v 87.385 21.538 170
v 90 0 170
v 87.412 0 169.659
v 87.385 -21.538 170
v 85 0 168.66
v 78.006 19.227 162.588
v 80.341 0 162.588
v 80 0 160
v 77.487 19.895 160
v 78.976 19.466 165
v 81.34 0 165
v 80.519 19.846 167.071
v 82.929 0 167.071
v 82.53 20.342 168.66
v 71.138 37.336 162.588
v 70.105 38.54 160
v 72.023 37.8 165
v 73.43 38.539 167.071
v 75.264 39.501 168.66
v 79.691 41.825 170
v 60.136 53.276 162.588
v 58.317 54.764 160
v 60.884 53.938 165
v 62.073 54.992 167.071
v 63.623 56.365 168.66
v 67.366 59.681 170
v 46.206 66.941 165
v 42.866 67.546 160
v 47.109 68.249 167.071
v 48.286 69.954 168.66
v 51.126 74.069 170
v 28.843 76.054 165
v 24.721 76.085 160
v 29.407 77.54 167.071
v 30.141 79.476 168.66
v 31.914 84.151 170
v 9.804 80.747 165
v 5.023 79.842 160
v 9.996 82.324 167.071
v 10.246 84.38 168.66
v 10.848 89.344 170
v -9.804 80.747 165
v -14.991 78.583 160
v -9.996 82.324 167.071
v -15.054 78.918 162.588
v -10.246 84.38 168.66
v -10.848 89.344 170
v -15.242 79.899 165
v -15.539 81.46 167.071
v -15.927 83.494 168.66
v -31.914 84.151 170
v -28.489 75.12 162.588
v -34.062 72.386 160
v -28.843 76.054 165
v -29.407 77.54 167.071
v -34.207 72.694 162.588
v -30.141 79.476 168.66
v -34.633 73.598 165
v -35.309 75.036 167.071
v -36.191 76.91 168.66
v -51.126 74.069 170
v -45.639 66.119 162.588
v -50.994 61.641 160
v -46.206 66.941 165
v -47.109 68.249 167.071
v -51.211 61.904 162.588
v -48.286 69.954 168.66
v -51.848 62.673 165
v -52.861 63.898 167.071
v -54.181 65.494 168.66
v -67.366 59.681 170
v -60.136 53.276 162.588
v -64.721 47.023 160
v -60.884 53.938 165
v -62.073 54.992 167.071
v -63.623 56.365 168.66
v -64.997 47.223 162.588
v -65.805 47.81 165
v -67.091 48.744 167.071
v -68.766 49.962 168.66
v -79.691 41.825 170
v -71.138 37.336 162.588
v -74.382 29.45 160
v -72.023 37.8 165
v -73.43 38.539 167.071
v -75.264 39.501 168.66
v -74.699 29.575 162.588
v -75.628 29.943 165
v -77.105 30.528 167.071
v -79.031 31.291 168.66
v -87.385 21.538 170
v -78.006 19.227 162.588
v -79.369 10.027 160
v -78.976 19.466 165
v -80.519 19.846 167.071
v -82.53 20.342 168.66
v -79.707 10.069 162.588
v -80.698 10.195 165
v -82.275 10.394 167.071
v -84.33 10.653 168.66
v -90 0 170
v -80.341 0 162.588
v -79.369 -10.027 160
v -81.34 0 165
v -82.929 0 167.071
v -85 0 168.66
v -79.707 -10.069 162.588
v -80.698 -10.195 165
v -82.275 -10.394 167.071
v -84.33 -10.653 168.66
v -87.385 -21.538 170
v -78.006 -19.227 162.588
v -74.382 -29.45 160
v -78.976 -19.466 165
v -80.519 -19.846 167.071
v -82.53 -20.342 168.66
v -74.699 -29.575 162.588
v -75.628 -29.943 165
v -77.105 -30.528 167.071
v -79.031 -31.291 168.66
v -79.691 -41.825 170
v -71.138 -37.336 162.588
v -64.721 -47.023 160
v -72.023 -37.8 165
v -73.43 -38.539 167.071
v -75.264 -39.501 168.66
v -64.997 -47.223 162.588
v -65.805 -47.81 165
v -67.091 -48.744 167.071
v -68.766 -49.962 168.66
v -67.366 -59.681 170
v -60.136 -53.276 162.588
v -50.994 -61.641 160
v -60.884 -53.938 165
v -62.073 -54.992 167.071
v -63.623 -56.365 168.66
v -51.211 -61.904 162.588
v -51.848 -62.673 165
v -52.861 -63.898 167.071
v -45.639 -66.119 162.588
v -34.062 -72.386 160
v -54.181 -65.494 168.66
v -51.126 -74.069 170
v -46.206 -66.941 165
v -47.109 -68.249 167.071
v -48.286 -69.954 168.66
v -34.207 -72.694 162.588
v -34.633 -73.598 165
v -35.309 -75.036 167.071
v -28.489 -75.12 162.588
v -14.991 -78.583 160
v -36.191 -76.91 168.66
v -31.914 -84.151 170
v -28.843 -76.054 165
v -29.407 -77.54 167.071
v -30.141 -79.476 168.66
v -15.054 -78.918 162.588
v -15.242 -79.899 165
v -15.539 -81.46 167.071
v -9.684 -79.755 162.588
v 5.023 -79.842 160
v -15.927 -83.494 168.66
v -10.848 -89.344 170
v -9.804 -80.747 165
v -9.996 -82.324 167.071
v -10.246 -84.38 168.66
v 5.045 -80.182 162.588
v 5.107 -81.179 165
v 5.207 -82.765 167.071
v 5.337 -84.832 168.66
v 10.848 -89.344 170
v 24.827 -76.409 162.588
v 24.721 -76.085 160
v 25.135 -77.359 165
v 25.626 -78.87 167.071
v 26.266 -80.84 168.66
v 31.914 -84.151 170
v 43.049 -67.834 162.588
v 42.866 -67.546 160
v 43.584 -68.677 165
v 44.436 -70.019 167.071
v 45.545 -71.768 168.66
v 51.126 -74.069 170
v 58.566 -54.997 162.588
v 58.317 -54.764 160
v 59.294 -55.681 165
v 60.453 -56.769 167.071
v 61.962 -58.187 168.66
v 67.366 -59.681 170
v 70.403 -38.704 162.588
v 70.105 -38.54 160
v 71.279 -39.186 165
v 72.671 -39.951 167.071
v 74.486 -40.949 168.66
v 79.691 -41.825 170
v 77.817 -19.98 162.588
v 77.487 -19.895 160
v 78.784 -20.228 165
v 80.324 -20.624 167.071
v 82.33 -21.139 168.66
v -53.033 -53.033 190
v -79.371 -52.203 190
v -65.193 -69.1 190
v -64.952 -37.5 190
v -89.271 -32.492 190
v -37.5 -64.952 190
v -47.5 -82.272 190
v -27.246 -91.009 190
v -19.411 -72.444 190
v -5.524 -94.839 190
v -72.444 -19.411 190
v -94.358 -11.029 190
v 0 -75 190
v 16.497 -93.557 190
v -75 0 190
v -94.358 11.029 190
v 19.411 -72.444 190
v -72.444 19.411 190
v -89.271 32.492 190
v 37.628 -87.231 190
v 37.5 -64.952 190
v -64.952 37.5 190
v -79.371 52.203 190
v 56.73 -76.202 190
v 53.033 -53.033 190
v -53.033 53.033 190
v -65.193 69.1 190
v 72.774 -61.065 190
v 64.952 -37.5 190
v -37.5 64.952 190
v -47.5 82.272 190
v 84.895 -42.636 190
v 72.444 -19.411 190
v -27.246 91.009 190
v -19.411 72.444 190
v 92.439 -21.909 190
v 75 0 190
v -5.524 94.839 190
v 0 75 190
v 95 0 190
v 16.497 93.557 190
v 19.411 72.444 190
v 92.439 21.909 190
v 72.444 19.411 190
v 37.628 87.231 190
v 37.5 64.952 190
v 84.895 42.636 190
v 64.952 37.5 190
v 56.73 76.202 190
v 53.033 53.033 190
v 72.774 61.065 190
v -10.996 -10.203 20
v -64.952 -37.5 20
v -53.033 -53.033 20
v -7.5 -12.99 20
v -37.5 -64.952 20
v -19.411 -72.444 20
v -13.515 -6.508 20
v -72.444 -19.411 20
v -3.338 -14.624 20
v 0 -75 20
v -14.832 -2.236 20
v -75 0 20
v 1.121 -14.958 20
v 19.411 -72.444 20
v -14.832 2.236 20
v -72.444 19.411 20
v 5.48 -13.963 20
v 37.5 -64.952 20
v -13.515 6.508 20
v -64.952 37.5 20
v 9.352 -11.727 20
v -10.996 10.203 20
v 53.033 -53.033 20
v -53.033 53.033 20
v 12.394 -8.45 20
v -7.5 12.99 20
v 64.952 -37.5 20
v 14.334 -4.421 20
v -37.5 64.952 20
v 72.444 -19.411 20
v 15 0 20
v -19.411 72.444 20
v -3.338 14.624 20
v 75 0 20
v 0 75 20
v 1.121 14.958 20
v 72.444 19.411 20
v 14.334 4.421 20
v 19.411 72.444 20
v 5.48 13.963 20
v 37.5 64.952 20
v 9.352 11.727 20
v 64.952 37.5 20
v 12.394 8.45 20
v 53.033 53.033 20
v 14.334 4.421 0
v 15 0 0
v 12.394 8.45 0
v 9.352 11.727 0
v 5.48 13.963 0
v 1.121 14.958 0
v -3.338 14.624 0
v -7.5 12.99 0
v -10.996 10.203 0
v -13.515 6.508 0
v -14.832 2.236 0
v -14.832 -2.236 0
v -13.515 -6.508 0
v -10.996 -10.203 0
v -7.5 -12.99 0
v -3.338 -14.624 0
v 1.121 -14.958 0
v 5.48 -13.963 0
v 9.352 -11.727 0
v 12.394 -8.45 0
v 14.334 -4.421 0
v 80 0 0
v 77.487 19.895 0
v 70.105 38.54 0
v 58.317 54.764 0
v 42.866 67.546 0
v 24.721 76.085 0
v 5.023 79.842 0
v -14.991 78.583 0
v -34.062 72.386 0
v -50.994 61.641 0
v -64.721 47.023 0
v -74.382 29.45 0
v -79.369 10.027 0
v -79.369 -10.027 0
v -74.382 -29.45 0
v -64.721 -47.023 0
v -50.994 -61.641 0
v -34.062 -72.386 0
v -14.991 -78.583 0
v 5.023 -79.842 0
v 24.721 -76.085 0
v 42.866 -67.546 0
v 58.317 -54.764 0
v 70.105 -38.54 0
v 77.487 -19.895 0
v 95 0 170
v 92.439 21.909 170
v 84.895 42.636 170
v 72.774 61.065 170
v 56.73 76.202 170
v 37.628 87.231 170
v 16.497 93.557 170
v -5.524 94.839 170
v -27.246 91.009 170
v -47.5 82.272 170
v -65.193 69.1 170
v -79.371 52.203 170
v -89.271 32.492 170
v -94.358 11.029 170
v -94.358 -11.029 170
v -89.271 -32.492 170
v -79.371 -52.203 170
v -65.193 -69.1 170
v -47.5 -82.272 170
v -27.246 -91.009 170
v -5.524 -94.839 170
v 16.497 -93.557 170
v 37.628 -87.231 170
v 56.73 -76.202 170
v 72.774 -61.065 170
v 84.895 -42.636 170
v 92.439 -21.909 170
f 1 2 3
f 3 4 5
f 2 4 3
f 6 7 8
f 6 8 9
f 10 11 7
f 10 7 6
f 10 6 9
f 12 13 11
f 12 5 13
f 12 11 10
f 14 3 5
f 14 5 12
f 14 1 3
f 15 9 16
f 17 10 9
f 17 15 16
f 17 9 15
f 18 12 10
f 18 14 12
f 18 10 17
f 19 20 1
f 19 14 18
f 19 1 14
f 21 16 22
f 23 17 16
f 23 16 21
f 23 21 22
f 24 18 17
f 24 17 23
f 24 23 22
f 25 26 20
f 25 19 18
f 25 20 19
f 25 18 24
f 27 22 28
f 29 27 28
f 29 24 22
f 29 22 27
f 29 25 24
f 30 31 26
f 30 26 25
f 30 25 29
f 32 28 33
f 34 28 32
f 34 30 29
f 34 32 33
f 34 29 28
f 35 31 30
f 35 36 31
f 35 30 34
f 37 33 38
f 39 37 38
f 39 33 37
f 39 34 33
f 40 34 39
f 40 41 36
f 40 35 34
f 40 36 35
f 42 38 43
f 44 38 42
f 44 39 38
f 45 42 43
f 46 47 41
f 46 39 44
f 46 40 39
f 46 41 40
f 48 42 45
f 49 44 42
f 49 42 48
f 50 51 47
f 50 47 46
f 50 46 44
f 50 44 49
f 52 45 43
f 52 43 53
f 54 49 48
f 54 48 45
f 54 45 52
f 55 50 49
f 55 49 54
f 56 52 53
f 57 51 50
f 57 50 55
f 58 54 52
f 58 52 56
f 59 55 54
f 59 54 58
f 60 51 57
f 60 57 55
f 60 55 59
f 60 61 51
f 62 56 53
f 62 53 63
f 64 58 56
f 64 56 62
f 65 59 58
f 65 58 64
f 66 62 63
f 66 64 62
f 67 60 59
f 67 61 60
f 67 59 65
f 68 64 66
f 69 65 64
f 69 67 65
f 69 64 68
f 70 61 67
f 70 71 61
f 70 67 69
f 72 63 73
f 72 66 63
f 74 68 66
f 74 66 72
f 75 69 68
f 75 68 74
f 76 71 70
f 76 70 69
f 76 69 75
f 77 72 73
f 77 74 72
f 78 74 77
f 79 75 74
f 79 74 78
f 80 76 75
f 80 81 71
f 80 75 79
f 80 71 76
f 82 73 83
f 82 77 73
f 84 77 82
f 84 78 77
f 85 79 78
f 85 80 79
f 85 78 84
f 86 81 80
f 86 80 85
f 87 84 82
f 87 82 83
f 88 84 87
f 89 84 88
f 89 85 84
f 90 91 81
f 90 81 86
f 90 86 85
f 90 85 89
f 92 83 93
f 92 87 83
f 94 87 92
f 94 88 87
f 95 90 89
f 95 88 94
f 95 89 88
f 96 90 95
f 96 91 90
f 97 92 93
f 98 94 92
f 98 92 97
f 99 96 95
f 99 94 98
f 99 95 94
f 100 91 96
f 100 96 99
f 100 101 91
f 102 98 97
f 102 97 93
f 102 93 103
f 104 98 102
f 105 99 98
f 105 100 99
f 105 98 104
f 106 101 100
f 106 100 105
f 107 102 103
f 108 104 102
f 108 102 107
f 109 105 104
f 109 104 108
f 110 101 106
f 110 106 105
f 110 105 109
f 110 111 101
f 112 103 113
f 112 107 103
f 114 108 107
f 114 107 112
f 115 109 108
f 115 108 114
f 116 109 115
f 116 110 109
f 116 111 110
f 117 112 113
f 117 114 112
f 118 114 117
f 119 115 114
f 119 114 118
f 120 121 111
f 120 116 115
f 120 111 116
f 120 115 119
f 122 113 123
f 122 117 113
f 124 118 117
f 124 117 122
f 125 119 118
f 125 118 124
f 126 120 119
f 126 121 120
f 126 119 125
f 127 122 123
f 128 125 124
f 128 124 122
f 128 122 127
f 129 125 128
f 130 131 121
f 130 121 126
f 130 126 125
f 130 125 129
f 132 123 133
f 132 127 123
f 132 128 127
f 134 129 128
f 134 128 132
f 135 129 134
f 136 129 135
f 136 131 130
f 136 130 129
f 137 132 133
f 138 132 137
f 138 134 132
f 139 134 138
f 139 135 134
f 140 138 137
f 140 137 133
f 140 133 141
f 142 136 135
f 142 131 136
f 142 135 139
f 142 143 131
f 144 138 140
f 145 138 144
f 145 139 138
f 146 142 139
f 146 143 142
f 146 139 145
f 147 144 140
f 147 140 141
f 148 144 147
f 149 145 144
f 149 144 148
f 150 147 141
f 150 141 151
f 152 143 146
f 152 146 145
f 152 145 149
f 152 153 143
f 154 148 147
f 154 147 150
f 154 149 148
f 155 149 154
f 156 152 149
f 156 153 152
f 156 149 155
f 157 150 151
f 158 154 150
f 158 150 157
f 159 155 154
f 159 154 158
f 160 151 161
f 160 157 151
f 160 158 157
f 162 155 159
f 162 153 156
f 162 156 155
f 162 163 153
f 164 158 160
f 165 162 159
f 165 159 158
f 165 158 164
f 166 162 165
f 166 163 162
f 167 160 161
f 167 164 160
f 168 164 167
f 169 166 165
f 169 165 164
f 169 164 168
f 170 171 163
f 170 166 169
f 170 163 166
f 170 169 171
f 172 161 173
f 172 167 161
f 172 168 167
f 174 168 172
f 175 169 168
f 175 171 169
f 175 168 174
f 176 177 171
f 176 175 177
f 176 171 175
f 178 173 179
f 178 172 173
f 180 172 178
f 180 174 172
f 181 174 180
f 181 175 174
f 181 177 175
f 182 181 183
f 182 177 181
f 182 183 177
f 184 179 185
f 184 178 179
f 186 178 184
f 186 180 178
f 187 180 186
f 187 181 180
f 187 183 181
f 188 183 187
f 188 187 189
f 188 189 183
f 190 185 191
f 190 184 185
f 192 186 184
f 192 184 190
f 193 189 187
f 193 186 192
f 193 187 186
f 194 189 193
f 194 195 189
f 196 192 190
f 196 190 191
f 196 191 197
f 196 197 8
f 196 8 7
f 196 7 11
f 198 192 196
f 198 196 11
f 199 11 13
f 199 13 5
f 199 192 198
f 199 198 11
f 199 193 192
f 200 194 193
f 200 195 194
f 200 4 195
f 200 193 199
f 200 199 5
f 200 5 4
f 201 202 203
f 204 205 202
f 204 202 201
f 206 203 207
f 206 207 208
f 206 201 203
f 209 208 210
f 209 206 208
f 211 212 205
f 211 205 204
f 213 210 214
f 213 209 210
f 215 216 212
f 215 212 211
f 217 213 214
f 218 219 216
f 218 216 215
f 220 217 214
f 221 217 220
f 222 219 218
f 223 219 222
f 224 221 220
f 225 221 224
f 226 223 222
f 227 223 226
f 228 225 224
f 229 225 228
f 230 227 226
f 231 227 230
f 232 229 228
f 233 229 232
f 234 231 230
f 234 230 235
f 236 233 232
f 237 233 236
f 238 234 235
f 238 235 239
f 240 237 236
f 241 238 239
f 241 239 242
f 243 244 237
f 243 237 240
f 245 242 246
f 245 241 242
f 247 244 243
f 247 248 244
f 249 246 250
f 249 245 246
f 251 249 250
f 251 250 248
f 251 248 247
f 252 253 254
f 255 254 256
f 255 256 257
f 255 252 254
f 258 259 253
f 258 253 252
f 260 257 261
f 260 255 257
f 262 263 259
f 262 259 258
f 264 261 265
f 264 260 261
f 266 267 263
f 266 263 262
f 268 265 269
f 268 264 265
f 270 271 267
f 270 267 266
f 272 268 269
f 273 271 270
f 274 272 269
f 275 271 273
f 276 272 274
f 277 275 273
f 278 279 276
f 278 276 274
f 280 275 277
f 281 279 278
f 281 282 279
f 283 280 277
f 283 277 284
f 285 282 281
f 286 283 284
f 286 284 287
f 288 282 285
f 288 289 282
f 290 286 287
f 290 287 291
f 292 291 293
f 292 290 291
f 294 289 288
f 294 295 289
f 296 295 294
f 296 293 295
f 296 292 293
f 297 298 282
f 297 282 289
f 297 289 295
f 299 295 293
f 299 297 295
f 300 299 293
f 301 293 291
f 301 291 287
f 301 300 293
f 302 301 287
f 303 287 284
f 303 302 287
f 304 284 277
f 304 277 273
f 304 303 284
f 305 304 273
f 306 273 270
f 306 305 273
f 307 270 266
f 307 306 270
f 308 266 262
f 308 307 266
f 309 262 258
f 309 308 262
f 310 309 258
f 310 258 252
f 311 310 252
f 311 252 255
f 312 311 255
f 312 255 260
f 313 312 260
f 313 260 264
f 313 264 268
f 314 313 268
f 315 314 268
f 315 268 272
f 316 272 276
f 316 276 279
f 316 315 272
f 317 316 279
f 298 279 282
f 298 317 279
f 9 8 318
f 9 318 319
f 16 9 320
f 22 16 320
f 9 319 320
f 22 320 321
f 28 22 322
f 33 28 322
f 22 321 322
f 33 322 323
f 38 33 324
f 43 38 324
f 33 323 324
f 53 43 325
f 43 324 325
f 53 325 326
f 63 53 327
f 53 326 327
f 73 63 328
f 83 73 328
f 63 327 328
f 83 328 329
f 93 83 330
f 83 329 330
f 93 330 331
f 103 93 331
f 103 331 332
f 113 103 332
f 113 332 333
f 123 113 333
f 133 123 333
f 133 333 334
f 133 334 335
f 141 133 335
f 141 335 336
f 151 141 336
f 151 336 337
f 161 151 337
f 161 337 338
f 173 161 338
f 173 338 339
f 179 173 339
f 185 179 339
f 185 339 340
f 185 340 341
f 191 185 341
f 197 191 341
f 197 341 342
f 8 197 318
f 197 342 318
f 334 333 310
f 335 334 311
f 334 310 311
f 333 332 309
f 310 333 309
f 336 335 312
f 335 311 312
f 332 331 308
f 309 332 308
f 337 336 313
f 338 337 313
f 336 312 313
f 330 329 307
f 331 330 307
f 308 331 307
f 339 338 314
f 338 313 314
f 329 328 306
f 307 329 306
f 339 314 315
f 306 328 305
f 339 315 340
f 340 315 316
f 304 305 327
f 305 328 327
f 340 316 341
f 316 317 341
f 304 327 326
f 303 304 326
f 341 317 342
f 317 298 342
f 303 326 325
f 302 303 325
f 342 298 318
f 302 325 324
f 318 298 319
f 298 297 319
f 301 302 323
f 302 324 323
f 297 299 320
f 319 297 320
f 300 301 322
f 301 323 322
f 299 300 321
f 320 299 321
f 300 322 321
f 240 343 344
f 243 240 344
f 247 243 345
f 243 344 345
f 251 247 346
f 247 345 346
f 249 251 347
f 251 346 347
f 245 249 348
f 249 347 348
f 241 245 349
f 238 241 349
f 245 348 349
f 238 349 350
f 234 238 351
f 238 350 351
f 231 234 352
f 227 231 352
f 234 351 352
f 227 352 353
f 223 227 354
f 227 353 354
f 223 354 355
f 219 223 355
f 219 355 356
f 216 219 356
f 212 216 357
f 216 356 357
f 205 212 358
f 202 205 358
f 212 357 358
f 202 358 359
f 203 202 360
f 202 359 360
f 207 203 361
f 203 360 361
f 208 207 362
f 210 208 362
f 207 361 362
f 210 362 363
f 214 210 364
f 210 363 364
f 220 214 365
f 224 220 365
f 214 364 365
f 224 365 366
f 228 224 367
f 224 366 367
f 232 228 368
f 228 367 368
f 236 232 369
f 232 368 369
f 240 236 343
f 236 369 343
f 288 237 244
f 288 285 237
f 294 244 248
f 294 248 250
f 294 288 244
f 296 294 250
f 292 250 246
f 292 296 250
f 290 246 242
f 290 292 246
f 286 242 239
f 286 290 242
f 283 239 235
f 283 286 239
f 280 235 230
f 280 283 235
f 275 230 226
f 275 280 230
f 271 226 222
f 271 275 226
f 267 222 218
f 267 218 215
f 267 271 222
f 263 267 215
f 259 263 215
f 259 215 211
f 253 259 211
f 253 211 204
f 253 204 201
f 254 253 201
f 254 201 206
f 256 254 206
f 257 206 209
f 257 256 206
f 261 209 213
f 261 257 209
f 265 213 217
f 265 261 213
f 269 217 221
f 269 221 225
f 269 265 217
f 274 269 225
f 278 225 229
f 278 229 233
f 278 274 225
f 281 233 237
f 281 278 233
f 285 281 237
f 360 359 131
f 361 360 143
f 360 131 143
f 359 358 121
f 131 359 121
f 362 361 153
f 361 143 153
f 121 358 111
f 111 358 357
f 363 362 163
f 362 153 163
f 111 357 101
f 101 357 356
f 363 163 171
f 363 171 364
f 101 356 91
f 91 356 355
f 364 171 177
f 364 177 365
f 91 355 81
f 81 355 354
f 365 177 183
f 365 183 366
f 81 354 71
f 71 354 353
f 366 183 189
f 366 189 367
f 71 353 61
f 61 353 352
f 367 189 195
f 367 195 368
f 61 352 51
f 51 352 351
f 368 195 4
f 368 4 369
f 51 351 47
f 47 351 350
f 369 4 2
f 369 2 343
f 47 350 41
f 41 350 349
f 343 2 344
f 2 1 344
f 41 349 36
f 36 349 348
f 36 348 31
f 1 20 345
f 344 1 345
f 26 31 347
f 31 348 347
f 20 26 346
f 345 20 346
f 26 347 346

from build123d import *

# Parameters (mm, degrees)
SKETCH1_R           = 80
SKETCH1_R_2         = 15
BOSS_EXTRUDE1_DEPTH = 20
SKETCH2_R           = 80
SKETCH2_R_2         = 75
BOSS_EXTRUDE2_DEPTH = 150
SKETCH3_R           = 95
SKETCH3_R_2         = 75
BOSS_EXTRUDE3_DEPTH = 20
FILLET1_R           = 10


with BuildPart() as part:
    # Sketch1 → Boss-Extrude1 (new body)
    with BuildSketch(Plane.XY):
        Circle(SKETCH1_R)
        Circle(SKETCH1_R_2, mode=Mode.SUBTRACT)
    extrude(amount=BOSS_EXTRUDE1_DEPTH)

    # Sketch2 → Boss-Extrude2 (add)
    with BuildSketch(Plane.XY.offset(20)):
        Circle(SKETCH2_R)
        Circle(SKETCH2_R_2, mode=Mode.SUBTRACT)
    extrude(amount=BOSS_EXTRUDE2_DEPTH)

    # Sketch3 → Boss-Extrude3 (add)
    with BuildSketch(Plane.XY.offset(170)):
        Circle(SKETCH3_R)
        Circle(SKETCH3_R_2, mode=Mode.SUBTRACT)
    extrude(amount=BOSS_EXTRUDE3_DEPTH)

    # Fillet1
    fillet1_edges = [part.edges().sort_by_distance(p)[0] for p in [
        (-80, 0, 170),
    ]]
    fillet(fillet1_edges, radius=FILLET1_R)


solid = part.part
